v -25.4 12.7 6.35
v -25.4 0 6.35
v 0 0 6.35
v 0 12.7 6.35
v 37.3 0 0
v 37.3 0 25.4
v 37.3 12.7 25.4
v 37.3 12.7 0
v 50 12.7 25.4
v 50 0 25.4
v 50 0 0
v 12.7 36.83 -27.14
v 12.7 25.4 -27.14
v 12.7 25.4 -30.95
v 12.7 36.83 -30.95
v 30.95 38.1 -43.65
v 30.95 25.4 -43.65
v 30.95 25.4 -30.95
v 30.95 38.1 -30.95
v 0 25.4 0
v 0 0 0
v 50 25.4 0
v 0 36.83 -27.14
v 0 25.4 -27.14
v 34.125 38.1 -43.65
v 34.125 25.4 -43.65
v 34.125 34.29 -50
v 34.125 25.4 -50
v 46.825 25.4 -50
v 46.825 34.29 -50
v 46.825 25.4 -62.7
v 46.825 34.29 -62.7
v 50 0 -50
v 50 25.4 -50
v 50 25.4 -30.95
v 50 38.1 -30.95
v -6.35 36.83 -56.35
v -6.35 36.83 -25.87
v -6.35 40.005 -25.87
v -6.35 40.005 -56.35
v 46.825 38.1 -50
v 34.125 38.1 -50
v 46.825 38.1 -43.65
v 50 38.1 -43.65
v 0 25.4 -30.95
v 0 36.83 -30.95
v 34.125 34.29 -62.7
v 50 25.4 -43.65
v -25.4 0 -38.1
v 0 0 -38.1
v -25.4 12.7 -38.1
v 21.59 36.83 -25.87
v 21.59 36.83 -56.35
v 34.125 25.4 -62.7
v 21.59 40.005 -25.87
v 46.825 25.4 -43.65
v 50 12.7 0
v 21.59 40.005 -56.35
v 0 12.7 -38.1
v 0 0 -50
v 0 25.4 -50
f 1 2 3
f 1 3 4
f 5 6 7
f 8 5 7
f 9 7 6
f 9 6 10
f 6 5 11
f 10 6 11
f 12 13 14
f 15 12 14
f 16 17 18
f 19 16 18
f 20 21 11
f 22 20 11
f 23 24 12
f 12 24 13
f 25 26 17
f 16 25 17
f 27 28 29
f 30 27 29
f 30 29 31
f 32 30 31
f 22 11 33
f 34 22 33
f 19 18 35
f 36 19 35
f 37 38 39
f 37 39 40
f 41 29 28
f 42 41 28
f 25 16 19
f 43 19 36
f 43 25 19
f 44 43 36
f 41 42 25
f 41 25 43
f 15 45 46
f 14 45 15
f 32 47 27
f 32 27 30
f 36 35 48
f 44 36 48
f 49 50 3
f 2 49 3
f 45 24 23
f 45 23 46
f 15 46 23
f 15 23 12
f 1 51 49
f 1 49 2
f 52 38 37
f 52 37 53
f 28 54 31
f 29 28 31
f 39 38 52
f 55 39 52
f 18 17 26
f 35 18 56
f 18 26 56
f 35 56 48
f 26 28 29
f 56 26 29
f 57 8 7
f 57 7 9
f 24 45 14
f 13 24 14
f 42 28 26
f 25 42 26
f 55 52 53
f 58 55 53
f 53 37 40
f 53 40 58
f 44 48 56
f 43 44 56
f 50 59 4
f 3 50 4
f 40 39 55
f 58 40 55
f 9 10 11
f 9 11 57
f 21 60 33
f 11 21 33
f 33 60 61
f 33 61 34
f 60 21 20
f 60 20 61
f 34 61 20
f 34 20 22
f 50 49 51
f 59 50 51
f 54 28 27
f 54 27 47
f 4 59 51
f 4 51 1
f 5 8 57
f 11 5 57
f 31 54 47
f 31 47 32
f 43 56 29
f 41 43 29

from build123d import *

# Parameters (mm, degrees)
SKETCH1_W          = 50
SKETCH1_H          = 50
MAIN_BOARDS_DEPTH  = 25.4
SKETCH2_W          = 12.7
SKETCH2_H          = 12.7
USB_DEPTH          = 25.4
SKETCH3_W          = 44.45
SKETCH3_H          = 12.7
PICKIT_DEPTH       = 25.4
HBRIDGE_DEPTH      = 12.7
SKETCH5_W          = 12.7
SKETCH5_H          = 12.7
MOTOR_WIRING_DEPTH = 8.89
SKETCH6_W          = 12.7
SKETCH6_H          = 3.81
HEADER_DEPTH       = 11.43
SKETCH7_W          = 27.94
SKETCH7_H          = 30.48
OLED_DEPTH         = 3.175


with BuildPart() as part:
    # Sketch1 → main boards (new body)
    with BuildSketch(Plane(origin=(0, 0, 0), x_dir=(1, 0, 0), z_dir=(0, 1, 0))):
        with Locations((25, 25)):
            Rectangle(SKETCH1_W, SKETCH1_H)
    extrude(amount=MAIN_BOARDS_DEPTH)


with BuildPart() as body_2:
    # Sketch2 → USB (new body)
    with BuildSketch(Plane.XY):
        with Locations((43.65, 6.35)):
            Rectangle(SKETCH2_W, SKETCH2_H)
    extrude(amount=USB_DEPTH)


with BuildPart() as body_3:
    # Sketch3 → PICKIT (new body)
    with BuildSketch(Plane.ZY):
        with Locations((-15.875, 6.35)):
            Rectangle(SKETCH3_W, SKETCH3_H)
    extrude(amount=PICKIT_DEPTH)


with BuildPart() as body_4:
    # Sketch4 → hbridge (new body)
    with BuildSketch(Plane(origin=(0, 25.4, 0), x_dir=(1, 0, 0), z_dir=(0, 1, 0))):
        Polygon((50, 43.65), (46.825, 43.65), (46.825, 50), (34.125, 50), (34.125, 43.65), (30.95, 43.65), (30.95, 30.95), (50, 30.95), align=None)
    extrude(amount=HBRIDGE_DEPTH)


with BuildPart() as body_5:
    # Sketch5 → motor wiring (new body)
    with BuildSketch(Plane(origin=(0, 25.4, 0), x_dir=(1, 0, 0), z_dir=(0, 1, 0))):
        with Locations((40.475, 56.35)):
            Rectangle(SKETCH5_W, SKETCH5_H)
    extrude(amount=MOTOR_WIRING_DEPTH)


with BuildPart() as body_6:
    # Sketch6 → header (new body)
    with BuildSketch(Plane(origin=(0, 25.4, 0), x_dir=(1, 0, 0), z_dir=(0, 1, 0))):
        with Locations((6.35, 29.045)):
            Rectangle(SKETCH6_W, SKETCH6_H)
    extrude(amount=HEADER_DEPTH)


with BuildPart() as body_7:
    # Sketch7 → OLED (new body)
    with BuildSketch(Plane(origin=(0, 36.83, 0), x_dir=(1, 0, 0), z_dir=(0, 1, 0))):
        with Locations((7.62, 41.11)):
            Rectangle(SKETCH7_W, SKETCH7_H)
    extrude(amount=OLED_DEPTH)


solid = Compound([part.part, body_2.part, body_3.part, body_4.part, body_5.part, body_6.part, body_7.part])
